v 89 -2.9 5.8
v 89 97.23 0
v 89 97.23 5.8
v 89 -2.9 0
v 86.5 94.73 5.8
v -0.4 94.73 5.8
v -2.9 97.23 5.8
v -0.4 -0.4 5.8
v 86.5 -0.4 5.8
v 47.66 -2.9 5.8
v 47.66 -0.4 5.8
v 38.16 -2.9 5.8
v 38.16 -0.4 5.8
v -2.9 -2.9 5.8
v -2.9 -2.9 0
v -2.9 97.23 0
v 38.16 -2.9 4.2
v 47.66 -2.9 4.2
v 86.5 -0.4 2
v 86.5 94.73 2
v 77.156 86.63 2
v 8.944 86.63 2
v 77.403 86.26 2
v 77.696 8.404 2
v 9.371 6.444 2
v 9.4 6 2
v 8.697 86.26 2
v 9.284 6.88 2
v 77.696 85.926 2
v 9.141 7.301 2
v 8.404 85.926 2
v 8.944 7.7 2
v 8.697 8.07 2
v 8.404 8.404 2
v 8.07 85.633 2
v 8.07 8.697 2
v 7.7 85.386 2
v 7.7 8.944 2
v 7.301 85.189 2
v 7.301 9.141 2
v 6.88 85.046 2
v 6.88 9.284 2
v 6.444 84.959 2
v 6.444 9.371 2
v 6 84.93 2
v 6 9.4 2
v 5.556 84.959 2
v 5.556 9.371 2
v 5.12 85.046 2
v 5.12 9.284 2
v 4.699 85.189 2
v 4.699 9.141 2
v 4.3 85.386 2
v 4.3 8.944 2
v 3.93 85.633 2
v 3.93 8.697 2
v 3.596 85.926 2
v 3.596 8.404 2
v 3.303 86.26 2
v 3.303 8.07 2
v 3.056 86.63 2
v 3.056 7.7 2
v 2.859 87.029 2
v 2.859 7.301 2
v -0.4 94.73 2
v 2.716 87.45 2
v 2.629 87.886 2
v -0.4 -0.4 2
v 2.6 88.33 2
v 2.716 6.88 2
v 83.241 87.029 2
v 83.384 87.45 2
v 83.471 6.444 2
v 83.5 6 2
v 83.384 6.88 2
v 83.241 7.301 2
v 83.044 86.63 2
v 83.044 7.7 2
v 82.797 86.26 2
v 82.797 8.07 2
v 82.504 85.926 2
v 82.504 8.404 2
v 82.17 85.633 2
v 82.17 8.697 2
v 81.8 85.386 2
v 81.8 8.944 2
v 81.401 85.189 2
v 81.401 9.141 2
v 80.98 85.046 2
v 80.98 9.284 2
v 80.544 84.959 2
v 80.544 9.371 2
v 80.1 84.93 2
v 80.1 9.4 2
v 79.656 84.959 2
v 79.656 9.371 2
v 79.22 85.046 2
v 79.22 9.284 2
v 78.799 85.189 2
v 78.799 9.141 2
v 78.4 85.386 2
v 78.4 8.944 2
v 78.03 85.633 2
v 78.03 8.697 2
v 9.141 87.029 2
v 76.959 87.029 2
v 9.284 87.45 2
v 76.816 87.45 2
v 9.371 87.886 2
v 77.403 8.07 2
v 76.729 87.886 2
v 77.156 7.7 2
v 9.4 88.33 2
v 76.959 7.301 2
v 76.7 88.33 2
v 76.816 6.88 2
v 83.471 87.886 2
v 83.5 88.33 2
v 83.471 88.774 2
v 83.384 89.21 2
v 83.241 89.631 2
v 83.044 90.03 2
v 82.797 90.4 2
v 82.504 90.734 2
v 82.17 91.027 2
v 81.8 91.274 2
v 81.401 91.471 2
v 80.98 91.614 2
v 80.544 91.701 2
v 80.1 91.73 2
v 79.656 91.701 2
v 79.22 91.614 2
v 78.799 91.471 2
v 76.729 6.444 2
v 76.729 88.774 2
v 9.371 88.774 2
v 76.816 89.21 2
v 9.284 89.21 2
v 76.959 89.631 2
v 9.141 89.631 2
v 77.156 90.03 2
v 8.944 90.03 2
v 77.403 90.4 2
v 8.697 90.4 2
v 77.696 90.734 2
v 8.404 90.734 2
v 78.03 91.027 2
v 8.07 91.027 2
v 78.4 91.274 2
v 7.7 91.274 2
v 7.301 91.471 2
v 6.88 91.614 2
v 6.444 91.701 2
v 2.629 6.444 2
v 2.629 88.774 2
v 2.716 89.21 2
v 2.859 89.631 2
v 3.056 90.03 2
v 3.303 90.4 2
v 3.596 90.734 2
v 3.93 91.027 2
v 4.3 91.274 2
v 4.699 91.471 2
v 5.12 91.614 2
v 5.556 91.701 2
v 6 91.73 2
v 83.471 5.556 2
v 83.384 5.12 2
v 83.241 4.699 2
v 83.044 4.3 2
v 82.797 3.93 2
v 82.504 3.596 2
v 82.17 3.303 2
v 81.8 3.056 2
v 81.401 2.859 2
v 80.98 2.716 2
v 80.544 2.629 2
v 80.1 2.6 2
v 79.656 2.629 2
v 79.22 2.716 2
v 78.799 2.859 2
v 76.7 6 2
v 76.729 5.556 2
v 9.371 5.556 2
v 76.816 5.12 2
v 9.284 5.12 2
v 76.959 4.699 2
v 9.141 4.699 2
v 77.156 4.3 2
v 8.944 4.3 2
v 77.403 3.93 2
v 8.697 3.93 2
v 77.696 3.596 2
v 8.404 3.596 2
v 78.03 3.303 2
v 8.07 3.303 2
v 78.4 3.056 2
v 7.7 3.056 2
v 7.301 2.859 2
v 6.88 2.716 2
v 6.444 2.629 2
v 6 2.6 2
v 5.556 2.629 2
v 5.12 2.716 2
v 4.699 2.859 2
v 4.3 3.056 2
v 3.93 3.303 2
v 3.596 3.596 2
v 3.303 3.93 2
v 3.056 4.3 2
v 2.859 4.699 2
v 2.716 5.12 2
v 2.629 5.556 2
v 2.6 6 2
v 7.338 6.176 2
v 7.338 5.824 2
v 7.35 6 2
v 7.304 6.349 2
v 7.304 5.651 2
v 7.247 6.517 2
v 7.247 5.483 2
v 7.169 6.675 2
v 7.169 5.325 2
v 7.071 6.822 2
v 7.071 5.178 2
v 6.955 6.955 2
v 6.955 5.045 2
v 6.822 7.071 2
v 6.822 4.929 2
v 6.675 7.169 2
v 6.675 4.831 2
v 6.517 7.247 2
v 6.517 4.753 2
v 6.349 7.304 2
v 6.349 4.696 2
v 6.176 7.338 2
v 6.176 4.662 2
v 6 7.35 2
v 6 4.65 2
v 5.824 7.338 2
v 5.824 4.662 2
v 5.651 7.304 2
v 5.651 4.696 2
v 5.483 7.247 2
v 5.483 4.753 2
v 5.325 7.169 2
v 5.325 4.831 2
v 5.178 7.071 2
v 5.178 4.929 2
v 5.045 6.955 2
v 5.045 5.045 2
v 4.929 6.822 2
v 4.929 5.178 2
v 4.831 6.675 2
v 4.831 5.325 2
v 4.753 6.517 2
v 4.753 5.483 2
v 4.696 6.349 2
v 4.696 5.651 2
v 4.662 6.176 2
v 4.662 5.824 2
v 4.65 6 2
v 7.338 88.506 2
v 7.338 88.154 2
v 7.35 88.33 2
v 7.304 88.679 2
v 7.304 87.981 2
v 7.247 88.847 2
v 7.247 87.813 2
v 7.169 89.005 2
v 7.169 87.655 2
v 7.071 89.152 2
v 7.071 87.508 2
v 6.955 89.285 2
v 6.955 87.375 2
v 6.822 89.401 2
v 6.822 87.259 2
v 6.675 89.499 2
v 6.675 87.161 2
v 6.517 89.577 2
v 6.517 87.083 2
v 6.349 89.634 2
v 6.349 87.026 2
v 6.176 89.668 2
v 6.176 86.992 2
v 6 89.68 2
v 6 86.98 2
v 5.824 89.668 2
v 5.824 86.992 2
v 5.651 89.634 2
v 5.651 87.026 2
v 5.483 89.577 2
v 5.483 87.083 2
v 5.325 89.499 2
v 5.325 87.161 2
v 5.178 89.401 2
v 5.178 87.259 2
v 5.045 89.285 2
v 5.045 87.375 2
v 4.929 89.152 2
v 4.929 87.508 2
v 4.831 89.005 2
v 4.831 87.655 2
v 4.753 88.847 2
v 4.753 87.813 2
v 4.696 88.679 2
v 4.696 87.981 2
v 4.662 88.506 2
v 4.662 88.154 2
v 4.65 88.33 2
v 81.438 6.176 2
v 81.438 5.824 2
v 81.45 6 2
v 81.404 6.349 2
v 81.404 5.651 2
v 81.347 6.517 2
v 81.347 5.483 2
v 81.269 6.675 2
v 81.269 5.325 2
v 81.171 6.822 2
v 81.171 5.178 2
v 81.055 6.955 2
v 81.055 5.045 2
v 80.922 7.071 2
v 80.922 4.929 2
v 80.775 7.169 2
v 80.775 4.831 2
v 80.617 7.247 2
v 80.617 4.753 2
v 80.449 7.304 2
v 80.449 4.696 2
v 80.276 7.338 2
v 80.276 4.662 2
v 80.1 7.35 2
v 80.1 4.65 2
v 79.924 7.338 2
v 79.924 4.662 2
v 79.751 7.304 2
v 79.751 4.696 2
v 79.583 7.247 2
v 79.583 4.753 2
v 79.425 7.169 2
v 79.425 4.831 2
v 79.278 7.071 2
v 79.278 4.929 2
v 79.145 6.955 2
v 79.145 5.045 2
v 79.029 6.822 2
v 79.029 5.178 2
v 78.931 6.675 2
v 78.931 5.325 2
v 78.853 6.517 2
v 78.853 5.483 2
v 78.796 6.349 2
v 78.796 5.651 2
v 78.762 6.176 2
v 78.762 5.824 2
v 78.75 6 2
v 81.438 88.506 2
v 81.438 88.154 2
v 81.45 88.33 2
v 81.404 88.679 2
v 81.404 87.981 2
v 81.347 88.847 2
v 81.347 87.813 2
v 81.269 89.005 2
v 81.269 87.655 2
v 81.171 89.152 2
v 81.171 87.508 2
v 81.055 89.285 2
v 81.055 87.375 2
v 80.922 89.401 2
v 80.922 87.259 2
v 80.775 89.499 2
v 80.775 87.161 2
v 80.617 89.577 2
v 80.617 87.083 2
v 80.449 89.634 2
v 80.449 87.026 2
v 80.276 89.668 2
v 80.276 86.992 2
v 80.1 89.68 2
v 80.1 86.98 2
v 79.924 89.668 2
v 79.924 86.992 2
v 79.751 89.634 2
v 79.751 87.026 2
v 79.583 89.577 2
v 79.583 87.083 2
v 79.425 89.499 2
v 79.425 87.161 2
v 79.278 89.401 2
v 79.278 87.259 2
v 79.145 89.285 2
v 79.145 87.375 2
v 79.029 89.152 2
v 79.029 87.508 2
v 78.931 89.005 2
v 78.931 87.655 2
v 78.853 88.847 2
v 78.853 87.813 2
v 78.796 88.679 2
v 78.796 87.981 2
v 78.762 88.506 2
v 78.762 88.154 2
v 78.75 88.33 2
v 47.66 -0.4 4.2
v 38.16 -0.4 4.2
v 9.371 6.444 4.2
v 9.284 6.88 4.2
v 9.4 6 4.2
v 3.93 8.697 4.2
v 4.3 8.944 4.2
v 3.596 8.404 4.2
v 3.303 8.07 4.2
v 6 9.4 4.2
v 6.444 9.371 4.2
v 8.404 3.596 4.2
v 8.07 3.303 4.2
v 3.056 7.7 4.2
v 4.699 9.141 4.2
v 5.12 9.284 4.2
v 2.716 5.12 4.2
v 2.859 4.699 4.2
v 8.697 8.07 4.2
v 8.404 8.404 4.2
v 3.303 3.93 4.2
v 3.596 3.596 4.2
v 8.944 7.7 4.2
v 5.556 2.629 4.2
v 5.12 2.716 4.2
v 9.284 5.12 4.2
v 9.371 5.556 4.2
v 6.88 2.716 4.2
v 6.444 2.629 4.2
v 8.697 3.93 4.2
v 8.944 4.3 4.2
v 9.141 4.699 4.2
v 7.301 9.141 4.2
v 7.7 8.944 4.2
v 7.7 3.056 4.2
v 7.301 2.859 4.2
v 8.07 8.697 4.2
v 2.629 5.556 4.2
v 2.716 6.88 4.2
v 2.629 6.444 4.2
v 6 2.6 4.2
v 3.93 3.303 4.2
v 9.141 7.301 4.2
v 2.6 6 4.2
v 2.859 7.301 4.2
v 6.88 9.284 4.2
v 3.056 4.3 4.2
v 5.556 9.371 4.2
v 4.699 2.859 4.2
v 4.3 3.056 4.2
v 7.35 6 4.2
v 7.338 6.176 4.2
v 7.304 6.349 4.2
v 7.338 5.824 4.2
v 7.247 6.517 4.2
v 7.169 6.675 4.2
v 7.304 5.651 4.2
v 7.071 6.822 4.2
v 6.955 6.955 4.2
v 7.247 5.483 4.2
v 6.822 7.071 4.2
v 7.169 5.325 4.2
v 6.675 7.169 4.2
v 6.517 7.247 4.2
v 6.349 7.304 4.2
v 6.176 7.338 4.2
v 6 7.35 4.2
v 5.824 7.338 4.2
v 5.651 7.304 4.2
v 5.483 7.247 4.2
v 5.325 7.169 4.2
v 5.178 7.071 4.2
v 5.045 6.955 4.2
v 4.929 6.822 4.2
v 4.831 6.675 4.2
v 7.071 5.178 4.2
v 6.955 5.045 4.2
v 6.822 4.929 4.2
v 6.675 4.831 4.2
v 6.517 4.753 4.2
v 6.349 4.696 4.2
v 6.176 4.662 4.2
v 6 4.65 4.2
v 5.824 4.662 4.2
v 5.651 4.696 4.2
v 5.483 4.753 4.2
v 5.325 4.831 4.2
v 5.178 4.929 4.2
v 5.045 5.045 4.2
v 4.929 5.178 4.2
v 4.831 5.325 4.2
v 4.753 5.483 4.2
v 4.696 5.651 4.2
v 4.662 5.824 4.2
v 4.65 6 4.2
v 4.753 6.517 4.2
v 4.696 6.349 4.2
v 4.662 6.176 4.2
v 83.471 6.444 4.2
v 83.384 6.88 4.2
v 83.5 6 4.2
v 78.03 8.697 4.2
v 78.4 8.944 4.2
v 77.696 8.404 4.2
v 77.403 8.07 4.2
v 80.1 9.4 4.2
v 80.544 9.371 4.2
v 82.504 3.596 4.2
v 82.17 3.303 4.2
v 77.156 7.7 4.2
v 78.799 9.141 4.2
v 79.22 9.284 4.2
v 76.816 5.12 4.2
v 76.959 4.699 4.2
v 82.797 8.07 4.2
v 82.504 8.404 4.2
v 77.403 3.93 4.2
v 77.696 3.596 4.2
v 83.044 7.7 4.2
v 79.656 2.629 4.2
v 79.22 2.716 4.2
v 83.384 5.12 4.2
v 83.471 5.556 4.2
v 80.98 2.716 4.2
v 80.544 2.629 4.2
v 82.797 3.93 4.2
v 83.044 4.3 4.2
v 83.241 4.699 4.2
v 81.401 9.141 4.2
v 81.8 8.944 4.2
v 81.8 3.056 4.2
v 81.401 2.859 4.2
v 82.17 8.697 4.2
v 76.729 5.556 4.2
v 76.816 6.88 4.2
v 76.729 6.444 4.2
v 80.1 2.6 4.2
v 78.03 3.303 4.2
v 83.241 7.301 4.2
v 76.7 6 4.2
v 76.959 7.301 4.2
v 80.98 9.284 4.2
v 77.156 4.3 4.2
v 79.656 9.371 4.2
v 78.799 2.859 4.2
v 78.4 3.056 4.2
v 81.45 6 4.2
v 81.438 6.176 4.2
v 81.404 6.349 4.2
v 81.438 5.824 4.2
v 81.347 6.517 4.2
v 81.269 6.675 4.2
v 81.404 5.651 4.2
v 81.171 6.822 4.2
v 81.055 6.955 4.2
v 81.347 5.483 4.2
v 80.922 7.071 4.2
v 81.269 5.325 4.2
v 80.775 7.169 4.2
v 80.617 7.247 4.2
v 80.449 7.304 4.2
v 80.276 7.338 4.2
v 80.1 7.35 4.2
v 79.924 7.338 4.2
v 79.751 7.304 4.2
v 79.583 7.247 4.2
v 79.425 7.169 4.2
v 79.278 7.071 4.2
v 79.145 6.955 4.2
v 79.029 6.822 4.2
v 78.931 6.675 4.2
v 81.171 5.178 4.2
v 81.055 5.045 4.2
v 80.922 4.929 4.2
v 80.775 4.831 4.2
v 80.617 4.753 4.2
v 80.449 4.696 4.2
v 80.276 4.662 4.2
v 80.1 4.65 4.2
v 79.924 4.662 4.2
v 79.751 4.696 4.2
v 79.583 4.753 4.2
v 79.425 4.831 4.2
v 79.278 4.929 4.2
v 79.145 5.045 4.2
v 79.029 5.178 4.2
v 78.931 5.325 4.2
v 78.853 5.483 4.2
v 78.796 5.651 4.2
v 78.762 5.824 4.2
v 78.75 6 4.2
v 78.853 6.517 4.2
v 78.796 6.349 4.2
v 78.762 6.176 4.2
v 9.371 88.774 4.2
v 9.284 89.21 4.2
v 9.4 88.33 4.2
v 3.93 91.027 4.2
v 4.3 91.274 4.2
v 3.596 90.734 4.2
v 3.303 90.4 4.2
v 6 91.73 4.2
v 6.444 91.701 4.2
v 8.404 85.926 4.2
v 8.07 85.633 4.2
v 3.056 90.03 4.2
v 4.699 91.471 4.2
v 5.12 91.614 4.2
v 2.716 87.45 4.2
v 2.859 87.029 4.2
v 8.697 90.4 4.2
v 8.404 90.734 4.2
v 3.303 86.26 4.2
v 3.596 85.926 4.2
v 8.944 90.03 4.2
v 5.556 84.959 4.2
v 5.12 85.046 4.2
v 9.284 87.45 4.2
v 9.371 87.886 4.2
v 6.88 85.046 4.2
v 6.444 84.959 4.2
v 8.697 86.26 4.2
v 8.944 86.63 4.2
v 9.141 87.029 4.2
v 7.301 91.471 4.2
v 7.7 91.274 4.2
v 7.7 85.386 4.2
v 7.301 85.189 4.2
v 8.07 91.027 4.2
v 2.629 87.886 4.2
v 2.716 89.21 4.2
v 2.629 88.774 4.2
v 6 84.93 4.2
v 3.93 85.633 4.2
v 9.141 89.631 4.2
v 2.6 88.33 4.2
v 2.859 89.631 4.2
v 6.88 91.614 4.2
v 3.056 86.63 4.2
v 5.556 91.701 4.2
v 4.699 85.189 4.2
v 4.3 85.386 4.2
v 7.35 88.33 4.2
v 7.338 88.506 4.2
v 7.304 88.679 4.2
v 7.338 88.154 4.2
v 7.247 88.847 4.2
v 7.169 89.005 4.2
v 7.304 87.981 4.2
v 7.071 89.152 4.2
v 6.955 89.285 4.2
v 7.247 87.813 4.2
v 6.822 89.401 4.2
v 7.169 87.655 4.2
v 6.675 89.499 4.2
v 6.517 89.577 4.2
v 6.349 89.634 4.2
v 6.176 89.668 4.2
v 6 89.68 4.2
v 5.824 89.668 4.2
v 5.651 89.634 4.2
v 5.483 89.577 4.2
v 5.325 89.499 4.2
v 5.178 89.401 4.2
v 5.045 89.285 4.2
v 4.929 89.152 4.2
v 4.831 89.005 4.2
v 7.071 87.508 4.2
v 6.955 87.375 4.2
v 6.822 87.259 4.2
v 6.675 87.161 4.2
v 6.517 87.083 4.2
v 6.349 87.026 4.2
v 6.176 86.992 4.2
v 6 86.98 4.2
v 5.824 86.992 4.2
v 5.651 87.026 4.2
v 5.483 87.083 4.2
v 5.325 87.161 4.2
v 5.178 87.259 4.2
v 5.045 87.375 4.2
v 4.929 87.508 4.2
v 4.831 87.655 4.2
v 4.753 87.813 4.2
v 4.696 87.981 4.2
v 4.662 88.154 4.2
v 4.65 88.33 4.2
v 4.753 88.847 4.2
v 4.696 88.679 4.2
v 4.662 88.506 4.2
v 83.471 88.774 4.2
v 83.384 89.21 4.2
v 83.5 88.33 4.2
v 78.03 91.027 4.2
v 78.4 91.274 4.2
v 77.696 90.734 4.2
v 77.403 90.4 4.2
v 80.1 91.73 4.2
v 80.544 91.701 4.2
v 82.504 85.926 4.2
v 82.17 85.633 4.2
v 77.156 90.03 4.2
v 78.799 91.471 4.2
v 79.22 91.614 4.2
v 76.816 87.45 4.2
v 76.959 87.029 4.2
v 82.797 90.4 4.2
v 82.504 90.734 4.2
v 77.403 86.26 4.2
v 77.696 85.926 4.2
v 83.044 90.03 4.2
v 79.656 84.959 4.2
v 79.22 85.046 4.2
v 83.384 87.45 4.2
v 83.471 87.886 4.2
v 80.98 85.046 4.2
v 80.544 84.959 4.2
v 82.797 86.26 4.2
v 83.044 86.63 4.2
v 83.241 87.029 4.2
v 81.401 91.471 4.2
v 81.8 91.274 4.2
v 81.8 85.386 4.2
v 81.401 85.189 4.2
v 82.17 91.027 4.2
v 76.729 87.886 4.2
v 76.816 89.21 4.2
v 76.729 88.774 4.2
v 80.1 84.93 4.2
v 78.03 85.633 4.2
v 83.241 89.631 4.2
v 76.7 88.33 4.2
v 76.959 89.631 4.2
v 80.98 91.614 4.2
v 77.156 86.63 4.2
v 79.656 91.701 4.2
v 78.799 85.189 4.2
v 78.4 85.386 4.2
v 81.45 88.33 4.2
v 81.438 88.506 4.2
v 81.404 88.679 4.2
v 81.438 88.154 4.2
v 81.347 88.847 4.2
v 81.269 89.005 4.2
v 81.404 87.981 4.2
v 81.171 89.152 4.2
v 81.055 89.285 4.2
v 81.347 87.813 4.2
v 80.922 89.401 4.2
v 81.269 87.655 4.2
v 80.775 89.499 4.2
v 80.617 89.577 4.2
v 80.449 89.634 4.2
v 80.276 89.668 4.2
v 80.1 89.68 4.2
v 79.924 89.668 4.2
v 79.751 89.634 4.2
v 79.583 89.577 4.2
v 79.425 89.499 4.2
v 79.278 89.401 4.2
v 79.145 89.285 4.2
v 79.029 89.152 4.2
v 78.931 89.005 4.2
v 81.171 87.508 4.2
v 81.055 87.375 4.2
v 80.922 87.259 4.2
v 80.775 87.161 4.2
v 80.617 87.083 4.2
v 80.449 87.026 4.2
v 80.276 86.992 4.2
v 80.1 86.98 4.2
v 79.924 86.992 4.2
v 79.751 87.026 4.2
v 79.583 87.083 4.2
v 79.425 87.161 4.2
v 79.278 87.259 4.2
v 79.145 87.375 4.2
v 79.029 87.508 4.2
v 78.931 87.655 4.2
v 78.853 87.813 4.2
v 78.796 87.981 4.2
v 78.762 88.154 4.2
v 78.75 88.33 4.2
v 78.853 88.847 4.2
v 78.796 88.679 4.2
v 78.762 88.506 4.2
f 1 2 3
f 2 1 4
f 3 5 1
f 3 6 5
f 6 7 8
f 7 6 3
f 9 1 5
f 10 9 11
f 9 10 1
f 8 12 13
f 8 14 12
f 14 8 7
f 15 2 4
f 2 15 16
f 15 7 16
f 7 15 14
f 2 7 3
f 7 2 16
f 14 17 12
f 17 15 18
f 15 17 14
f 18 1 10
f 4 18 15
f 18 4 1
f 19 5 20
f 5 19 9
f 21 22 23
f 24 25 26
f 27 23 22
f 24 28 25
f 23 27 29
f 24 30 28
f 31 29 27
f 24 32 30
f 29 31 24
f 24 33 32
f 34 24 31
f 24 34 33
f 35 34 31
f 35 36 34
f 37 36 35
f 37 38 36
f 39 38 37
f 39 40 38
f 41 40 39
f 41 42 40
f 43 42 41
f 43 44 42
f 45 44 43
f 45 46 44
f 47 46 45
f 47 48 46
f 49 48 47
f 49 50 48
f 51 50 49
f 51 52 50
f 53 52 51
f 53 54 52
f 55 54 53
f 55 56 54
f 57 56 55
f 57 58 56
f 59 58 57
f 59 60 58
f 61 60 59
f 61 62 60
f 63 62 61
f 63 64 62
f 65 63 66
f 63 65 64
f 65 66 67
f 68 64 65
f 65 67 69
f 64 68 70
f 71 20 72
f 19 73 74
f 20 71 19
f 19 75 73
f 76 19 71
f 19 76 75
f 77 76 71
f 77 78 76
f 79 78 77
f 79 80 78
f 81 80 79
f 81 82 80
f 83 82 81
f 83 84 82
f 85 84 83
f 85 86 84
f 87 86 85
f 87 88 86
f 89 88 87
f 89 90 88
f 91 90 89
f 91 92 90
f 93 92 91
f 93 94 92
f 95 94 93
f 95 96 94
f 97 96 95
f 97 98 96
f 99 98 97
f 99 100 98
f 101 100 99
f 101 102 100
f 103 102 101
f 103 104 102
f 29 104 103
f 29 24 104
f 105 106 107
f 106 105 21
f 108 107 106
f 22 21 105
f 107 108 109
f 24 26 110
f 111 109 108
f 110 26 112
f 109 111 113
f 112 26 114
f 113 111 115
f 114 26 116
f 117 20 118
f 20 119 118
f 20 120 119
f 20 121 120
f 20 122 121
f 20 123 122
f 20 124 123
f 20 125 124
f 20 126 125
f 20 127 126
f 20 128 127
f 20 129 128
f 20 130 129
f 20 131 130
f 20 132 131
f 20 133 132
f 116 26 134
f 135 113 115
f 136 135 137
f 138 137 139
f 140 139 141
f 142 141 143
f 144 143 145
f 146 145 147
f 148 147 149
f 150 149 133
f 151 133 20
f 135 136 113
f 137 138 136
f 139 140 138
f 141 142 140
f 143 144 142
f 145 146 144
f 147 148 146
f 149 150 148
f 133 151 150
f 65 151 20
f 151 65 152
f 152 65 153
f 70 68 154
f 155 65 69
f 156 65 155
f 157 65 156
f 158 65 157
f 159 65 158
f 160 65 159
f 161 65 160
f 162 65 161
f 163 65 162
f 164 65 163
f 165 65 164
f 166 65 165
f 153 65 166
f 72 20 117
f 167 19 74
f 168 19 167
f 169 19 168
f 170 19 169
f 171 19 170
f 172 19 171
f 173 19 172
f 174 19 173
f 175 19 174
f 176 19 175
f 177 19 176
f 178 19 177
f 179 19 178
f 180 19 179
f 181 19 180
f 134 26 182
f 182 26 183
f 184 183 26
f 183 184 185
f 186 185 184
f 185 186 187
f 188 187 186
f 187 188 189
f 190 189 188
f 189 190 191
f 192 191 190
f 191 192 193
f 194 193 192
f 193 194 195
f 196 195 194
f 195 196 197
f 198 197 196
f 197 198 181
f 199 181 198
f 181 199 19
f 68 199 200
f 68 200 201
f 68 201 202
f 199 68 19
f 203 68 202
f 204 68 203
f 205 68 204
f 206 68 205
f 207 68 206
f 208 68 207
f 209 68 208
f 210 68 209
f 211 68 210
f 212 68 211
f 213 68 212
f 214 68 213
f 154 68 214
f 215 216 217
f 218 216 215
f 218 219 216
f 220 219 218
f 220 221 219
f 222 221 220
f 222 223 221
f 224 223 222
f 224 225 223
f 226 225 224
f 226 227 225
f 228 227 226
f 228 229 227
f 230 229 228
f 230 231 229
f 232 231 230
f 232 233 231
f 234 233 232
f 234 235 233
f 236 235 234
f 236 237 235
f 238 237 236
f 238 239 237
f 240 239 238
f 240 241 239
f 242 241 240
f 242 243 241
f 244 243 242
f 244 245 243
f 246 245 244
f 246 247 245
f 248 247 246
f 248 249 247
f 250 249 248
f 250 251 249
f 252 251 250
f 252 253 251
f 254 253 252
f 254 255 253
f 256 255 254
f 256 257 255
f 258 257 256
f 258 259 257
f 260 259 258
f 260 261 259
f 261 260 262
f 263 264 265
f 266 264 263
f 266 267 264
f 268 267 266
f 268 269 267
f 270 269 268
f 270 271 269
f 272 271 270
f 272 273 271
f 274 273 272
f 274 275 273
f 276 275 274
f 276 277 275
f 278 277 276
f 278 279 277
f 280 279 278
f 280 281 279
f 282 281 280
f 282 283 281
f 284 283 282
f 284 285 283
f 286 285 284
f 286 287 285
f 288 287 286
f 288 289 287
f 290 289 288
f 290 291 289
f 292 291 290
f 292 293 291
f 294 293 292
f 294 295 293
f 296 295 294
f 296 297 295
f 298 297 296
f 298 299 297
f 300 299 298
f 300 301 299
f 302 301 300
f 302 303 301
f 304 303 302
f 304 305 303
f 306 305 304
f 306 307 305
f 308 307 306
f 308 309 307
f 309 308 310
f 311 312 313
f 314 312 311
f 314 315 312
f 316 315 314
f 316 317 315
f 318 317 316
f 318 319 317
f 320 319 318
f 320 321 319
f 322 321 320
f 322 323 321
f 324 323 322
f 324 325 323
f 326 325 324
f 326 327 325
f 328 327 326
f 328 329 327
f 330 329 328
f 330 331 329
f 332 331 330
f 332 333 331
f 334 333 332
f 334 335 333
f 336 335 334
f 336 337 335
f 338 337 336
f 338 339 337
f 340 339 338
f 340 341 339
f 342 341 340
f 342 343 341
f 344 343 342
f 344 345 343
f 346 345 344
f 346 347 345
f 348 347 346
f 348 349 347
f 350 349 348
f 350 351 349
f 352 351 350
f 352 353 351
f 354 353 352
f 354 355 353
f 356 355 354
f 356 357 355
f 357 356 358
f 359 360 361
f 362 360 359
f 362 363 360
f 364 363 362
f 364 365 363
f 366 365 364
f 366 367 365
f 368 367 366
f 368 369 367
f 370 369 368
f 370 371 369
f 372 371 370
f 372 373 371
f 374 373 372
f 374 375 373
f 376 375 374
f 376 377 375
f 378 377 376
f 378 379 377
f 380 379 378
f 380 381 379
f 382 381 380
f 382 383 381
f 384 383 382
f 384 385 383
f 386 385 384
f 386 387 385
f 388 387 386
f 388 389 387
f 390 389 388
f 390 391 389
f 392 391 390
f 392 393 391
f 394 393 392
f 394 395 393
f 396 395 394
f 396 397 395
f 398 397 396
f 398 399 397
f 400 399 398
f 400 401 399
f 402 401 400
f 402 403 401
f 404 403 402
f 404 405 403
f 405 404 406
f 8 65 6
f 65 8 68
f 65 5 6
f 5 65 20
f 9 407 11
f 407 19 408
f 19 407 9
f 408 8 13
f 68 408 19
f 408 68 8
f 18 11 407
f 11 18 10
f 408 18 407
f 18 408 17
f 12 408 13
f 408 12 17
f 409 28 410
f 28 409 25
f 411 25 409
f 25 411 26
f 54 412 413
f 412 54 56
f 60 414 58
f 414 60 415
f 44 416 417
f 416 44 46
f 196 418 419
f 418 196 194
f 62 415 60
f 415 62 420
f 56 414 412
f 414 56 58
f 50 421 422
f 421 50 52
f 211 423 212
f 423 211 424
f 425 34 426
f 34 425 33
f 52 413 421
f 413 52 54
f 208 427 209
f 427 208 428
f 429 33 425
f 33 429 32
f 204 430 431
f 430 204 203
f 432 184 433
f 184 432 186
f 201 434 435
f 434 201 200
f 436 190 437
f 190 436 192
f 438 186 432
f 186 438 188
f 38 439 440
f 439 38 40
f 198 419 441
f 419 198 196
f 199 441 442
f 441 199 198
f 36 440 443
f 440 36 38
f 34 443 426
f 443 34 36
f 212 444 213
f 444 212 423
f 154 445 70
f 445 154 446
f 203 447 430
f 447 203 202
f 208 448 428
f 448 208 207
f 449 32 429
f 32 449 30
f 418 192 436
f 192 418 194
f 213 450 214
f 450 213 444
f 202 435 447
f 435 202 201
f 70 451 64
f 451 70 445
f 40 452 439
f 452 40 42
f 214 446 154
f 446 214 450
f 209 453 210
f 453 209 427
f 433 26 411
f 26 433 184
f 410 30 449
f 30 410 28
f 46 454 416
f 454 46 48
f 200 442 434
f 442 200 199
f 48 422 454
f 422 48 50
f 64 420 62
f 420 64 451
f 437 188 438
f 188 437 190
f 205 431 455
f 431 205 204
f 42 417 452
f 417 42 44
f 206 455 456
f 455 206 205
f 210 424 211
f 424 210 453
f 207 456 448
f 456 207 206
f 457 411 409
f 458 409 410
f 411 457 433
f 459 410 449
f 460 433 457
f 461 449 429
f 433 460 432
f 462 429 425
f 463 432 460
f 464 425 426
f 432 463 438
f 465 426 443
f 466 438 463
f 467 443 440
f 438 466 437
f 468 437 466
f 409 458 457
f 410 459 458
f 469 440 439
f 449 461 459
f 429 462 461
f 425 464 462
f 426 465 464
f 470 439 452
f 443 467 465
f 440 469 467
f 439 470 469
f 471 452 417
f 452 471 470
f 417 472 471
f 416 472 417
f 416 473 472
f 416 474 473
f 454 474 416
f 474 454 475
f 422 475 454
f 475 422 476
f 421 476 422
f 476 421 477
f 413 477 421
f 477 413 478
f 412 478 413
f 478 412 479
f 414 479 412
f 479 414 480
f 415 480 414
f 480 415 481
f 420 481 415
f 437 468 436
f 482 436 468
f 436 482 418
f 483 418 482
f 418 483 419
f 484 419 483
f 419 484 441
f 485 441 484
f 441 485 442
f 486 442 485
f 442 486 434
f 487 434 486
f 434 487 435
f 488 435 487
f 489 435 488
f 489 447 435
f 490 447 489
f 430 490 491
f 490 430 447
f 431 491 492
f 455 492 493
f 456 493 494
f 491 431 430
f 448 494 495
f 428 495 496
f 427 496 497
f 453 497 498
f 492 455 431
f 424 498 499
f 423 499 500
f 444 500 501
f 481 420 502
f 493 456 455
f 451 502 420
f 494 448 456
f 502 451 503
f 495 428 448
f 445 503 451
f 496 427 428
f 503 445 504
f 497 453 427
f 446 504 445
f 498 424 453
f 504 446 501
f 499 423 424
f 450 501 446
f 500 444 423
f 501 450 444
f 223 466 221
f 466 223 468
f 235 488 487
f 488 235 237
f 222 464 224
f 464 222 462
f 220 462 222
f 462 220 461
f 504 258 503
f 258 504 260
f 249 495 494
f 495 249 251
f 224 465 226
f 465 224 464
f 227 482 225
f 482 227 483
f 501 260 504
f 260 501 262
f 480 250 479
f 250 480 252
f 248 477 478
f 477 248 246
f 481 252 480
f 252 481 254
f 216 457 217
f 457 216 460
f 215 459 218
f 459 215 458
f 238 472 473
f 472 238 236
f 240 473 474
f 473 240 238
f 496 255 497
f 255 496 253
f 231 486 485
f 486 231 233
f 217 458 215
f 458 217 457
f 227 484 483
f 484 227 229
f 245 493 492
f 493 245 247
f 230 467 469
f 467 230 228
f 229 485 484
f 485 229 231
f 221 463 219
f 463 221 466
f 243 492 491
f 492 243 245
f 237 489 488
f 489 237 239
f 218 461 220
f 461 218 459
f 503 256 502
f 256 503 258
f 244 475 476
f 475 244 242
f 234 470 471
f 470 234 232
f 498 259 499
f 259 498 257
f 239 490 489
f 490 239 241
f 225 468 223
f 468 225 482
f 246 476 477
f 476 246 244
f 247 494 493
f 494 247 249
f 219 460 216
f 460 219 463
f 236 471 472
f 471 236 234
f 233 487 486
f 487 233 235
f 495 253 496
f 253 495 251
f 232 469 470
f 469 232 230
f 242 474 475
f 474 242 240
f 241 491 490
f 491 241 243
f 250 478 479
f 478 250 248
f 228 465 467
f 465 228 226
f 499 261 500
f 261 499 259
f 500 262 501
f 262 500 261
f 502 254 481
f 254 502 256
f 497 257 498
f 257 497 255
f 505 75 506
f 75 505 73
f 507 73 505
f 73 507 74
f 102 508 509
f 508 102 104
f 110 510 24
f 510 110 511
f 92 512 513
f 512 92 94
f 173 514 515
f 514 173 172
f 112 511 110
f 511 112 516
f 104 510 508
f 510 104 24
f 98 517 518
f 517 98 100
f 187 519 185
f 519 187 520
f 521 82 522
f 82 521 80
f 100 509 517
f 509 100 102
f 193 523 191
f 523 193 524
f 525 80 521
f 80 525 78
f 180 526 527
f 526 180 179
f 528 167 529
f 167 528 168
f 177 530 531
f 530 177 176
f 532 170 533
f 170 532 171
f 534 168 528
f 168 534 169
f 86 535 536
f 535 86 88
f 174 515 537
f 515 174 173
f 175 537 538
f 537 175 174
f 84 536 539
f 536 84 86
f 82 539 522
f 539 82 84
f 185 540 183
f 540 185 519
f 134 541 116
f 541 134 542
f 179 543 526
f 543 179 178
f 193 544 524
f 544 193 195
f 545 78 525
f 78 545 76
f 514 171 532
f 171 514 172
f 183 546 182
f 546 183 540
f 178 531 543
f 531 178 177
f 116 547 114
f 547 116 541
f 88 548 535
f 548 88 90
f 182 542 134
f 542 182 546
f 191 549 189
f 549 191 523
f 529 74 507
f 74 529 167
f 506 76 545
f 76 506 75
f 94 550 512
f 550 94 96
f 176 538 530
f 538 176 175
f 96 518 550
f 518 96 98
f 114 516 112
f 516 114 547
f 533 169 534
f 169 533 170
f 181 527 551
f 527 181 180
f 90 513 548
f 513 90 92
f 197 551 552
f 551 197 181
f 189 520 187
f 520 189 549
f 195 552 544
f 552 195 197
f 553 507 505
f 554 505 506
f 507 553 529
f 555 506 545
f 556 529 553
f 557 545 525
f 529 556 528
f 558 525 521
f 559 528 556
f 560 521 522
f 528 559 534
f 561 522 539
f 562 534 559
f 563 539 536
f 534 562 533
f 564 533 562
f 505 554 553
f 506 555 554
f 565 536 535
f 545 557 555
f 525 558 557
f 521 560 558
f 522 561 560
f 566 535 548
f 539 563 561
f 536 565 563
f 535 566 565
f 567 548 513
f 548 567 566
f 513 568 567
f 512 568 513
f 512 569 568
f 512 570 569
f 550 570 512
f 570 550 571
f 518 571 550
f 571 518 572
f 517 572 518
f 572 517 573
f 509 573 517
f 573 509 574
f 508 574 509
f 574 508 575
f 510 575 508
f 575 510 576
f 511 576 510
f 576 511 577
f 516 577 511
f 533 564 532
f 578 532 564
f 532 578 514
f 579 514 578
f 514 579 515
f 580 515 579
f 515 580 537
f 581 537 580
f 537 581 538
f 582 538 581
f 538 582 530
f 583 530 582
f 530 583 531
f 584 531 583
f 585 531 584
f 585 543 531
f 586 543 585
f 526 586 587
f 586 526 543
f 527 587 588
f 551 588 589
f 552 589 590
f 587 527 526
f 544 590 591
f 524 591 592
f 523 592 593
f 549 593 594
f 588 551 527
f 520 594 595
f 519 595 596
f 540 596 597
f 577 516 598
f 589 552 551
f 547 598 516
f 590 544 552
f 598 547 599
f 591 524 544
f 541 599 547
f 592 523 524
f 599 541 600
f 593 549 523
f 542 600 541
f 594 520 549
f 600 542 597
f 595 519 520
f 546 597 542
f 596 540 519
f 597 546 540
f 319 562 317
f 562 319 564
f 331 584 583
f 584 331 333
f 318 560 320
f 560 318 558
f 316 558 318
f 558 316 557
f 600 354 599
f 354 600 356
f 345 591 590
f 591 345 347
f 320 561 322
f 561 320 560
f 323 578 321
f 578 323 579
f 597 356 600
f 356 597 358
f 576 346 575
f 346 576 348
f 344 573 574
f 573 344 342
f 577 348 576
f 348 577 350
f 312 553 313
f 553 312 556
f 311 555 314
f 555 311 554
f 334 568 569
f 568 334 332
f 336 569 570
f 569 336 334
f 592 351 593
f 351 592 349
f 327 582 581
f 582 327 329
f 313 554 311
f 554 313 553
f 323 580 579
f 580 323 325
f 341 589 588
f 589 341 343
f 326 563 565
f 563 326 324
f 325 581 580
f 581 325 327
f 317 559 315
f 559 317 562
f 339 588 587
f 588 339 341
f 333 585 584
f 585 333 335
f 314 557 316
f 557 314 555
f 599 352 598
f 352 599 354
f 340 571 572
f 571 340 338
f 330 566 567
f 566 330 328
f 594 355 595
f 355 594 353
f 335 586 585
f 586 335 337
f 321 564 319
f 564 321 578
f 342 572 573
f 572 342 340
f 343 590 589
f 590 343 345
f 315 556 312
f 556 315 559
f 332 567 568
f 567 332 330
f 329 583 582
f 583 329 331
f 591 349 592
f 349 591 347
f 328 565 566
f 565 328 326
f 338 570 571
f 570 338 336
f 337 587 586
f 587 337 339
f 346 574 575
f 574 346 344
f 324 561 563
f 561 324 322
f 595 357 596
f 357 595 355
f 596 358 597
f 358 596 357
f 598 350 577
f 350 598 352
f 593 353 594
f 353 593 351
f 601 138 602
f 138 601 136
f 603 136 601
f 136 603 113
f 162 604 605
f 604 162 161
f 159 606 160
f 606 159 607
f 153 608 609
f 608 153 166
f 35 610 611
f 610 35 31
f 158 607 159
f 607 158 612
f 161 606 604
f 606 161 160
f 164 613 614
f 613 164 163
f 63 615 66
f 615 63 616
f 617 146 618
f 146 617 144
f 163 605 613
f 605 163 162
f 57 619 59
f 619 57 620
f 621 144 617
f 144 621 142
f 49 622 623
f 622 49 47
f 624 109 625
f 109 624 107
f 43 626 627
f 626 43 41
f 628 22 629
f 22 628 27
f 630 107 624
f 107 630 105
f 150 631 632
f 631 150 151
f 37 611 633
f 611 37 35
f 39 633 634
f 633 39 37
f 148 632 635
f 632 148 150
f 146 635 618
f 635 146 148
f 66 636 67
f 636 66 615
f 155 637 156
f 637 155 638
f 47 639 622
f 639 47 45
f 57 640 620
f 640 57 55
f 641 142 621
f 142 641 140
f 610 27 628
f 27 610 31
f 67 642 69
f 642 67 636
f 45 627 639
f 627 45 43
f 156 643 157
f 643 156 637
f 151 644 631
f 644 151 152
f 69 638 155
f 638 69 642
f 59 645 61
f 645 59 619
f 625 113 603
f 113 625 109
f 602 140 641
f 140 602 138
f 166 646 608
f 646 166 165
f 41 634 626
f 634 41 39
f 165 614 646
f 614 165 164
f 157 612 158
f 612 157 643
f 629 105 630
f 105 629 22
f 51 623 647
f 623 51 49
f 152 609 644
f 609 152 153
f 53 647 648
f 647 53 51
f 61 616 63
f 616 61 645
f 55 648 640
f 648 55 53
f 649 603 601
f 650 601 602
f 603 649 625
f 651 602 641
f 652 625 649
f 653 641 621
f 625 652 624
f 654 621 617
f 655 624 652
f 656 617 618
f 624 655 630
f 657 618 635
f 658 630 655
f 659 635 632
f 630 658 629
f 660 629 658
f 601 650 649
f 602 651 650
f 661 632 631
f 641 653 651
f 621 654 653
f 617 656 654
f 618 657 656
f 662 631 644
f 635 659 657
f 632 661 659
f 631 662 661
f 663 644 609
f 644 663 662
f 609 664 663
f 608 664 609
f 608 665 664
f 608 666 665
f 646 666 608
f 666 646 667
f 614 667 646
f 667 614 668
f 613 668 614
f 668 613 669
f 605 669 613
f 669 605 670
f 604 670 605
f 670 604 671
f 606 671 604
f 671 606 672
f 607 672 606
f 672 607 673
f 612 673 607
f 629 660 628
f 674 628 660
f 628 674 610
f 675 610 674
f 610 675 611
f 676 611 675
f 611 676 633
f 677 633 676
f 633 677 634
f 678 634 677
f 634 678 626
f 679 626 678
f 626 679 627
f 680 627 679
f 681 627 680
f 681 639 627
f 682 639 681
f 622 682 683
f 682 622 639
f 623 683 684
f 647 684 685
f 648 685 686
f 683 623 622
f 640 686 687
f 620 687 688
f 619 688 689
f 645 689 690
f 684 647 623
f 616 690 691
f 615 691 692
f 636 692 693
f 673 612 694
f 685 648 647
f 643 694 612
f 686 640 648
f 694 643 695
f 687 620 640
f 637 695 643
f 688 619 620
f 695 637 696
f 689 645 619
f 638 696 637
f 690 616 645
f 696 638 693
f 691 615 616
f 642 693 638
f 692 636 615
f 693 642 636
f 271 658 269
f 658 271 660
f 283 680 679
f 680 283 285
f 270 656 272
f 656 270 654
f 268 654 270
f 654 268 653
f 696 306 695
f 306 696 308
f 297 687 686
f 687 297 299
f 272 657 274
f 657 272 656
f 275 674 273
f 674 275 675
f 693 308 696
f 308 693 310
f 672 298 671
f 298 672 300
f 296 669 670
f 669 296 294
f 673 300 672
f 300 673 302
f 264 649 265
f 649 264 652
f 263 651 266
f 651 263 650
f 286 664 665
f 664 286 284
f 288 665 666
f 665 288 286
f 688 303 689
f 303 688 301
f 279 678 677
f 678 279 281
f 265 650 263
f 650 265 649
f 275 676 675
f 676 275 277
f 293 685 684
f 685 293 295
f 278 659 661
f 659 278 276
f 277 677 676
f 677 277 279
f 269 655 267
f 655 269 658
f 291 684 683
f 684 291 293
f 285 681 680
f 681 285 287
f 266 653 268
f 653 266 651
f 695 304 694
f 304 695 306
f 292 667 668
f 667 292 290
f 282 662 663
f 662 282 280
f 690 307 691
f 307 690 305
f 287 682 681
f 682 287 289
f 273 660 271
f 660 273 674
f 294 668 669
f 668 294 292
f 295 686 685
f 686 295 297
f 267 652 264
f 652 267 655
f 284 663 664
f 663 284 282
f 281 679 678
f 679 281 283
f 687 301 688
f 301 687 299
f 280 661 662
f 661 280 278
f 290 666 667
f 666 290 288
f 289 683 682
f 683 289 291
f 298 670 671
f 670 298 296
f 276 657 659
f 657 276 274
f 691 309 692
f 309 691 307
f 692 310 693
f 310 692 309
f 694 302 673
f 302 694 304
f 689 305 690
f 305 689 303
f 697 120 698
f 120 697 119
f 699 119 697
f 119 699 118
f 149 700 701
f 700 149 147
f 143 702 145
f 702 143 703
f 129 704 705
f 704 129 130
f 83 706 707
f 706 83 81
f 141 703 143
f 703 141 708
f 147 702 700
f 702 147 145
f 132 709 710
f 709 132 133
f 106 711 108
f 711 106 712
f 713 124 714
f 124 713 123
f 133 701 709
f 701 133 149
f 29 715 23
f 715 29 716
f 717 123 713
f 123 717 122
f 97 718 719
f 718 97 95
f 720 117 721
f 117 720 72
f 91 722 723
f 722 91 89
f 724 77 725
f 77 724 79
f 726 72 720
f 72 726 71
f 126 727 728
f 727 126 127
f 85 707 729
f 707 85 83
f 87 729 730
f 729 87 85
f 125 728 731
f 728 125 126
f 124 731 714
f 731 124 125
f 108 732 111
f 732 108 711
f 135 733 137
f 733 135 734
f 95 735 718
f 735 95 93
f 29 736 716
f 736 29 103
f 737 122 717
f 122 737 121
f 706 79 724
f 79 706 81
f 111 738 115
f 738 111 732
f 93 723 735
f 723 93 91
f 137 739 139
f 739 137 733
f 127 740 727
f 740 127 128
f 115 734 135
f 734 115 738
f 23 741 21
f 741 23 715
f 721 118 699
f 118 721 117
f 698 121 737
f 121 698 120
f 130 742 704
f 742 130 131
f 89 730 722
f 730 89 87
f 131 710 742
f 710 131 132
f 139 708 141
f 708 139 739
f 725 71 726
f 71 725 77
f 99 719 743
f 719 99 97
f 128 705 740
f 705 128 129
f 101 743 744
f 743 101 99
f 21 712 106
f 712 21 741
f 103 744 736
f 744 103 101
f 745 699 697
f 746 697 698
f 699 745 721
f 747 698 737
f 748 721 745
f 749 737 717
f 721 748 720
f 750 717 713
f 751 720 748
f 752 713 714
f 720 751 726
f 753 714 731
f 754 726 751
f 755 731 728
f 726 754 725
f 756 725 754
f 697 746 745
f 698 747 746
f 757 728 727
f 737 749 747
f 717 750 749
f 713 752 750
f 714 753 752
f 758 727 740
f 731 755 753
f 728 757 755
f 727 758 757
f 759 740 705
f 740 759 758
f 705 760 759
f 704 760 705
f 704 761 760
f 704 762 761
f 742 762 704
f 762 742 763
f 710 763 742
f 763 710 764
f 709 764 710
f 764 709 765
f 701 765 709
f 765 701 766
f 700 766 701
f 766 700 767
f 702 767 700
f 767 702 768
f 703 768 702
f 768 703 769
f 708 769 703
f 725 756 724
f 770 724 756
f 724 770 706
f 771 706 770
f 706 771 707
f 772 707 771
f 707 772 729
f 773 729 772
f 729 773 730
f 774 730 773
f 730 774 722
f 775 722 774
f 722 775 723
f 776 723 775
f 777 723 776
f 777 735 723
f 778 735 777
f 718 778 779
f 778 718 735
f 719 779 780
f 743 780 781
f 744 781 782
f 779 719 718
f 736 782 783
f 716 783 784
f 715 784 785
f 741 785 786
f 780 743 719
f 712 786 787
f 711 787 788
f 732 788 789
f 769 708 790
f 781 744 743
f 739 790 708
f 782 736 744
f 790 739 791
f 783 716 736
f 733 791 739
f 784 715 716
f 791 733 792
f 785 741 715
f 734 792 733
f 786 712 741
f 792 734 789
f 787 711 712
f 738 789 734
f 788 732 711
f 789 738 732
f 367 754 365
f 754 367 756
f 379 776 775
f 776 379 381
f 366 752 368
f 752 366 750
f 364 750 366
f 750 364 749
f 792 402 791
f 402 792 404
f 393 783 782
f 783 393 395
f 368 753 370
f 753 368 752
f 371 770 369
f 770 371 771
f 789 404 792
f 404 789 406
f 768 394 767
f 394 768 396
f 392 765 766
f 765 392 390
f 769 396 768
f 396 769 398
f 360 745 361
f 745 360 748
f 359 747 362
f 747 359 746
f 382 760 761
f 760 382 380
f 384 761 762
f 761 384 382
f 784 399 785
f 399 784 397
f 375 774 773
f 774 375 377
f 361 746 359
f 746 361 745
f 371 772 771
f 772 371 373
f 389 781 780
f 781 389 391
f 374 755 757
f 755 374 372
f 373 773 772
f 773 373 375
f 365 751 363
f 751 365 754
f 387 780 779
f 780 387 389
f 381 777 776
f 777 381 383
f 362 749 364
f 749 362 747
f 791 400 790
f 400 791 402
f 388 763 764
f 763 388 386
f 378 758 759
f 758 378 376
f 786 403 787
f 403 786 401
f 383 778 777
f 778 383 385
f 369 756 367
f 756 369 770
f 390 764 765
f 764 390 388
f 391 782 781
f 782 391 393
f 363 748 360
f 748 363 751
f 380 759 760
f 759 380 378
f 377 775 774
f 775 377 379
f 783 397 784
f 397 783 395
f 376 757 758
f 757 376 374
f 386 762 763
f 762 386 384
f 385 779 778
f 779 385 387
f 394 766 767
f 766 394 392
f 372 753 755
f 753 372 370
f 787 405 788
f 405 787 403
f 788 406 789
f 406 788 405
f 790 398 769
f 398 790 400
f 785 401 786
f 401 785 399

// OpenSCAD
// -------------------------------------------------------------
//  Phantom Pad - printable case (parametric, OpenSCAD)
//
//  Sandwich case: the PCB (no mounting holes) is captured between a
//  BASE tray and a top PLATE, held by 4 corner screws through standoffs.
//
//  All key/encoder cutouts are placed at the EXACT footprint positions
//  pulled from mk1.kicad_pcb (board origin = board min corner
//  94.492612, 33.242612 mm), so the plate lines up with the real board.
//
//  Board outline: 86.10 x 94.33 mm, XIAO USB faces the top edge (y=0).
//  Units: mm.
//
//  Render one part at a time with -D PART="base" | "plate" | "keycap" | "knob"
// -------------------------------------------------------------

PART = "base";           // base | plate | keycap | knob   (overridden by -D)
$fn  = 48;

// -- board --
BOARD_W = 86.10;
BOARD_H = 94.33;
PCB_T   = 1.6;           // 2-layer board thickness

// -- fit / walls --
SLACK   = 0.4;           // per-side clearance around the PCB in the tray
WALL    = 2.5;
FLOOR   = 2.0;
PLATE_T = 3.0;
STANDOFF_H = PCB_T + 0.6;   // lifts plate just above the board

// -- switches / encoders --
KEY_CUT = 14.0;          // Cherry MX plate cutout (14.0 mm square)
ENC_D   = 7.2;           // EC11 bushing hole
CAP     = 18.0;          // keycap footprint
CAP_H   = 7.0;

// USB-C slot on the top wall (XIAO connector faces y=0)
USB_W = 9.5; USB_H = 3.6;
XIAO_X = 42.91;          // U1 x, relative to board origin

// -- screw standoffs (M3 self-tap into plastic) --
SCREW_R   = 1.35;        // pilot for M3 self-tapping
BOSS_R    = 3.4;
BOSS_INSET = 6.0;
boss_xy = [
  [BOSS_INSET,            BOSS_INSET],
  [BOARD_W - BOSS_INSET,  BOSS_INSET],
  [BOSS_INSET,            BOARD_H - BOSS_INSET],
  [BOARD_W - BOSS_INSET,  BOARD_H - BOSS_INSET],
];

// -- EXACT switch positions (relative to board origin), from mk1.kicad_pcb --
keys = [
  [17.36,37.88],[36.32,37.88],[55.37,37.88],[74.42,37.88],  // row 1
  [17.27,56.93],[36.32,56.93],[55.37,56.93],[74.42,56.93],  // row 2
  [17.27,75.98],[36.32,75.98],[55.37,75.98],[74.42,75.98],  // row 3
];
encoders = [ [6.80,19.73], [64.14,20.21] ];   // SW14 (left), SW13 (right)

// tray inner cavity size (PCB + slack)
inner_w = BOARD_W + 2*SLACK;
inner_h = BOARD_H + 2*SLACK;
outer_w = inner_w + 2*WALL;
outer_h = inner_h + 2*WALL;

// ------------------------- BASE -------------------------
module base() {
  difference() {
    union() {
      // outer shell
      translate([-WALL-SLACK, -WALL-SLACK, 0])
        cube([outer_w, outer_h, FLOOR + STANDOFF_H + PCB_T]);
    }
    // hollow the cavity that holds the PCB (walls remain)
    translate([-SLACK, -SLACK, FLOOR])
      cube([inner_w, inner_h, STANDOFF_H + PCB_T + 1]);
    // USB-C slot in the top wall
    translate([XIAO_X - USB_W/2, -WALL-SLACK-0.1, FLOOR + STANDOFF_H])
      cube([USB_W, WALL + SLACK + 0.2, USB_H]);
  }
  // 4 corner standoffs the PCB rests against; screws self-tap here
  for (p = boss_xy)
    translate([p[0], p[1], FLOOR])
      difference() {
        cylinder(r = BOSS_R, h = STANDOFF_H);
        translate([0,0,-0.1]) cylinder(r = SCREW_R, h = STANDOFF_H + 0.2);
      }
}

// ------------------------- PLATE -------------------------
module plate() {
  difference() {
    // plate matches the outer footprint so it caps the tray
    translate([-WALL-SLACK, -WALL-SLACK, 0])
      cube([outer_w, outer_h, PLATE_T]);
    // 12 switch cutouts
    for (k = keys)
      translate([k[0]-KEY_CUT/2, k[1]-KEY_CUT/2, -0.1])
        cube([KEY_CUT, KEY_CUT, PLATE_T+0.2]);
    // 2 encoder bushing holes
    for (e = encoders)
      translate([e[0], e[1], -0.1])
        cylinder(d = ENC_D, h = PLATE_T+0.2);
    // 4 screw clearance holes (through)
    for (p = boss_xy)
      translate([p[0], p[1], -0.1])
        cylinder(r = SCREW_R + 0.35, h = PLATE_T+0.2);
  }
}

// ------------------- KEYCAP (simple, printable) -------------------
module keycap() {
  difference() {
    hull() {
      translate([-CAP/2,-CAP/2,0]) cube([CAP,CAP,0.1]);
      translate([-(CAP-3)/2,-(CAP-3)/2,CAP_H-0.1]) cube([CAP-3,CAP-3,0.1]);
    }
    // MX stem socket (+ cross)
    translate([0,0,-0.1]) {
      cylinder(d=5.6,h=4);
      translate([-2.05,-0.55,0]) cube([4.1,1.1,4]);
      translate([-0.55,-2.05,0]) cube([1.1,4.1,4]);
    }
  }
}

// ------------------- ENCODER KNOB -------------------
module knob() {
  KN_D=18; KN_H=14;
  difference() {
    union() {
      cylinder(d=KN_D,h=KN_H);
      for (i=[0:11]) rotate([0,0,i*30]) translate([KN_D/2-0.4,0,0]) cylinder(d=1.6,h=KN_H);
    }
    // D-shaft 6mm with flat
    translate([0,0,-0.1]) difference() {
      cylinder(d=6.1,h=KN_H-3);
      translate([1.5,-4,-0.2]) cube([4,8,KN_H]);   // flat
    }
  }
}

if      (PART == "base")   base();
else if (PART == "plate")  plate();
else if (PART == "keycap") keycap();
else if (PART == "knob")   knob();
else                       base();
